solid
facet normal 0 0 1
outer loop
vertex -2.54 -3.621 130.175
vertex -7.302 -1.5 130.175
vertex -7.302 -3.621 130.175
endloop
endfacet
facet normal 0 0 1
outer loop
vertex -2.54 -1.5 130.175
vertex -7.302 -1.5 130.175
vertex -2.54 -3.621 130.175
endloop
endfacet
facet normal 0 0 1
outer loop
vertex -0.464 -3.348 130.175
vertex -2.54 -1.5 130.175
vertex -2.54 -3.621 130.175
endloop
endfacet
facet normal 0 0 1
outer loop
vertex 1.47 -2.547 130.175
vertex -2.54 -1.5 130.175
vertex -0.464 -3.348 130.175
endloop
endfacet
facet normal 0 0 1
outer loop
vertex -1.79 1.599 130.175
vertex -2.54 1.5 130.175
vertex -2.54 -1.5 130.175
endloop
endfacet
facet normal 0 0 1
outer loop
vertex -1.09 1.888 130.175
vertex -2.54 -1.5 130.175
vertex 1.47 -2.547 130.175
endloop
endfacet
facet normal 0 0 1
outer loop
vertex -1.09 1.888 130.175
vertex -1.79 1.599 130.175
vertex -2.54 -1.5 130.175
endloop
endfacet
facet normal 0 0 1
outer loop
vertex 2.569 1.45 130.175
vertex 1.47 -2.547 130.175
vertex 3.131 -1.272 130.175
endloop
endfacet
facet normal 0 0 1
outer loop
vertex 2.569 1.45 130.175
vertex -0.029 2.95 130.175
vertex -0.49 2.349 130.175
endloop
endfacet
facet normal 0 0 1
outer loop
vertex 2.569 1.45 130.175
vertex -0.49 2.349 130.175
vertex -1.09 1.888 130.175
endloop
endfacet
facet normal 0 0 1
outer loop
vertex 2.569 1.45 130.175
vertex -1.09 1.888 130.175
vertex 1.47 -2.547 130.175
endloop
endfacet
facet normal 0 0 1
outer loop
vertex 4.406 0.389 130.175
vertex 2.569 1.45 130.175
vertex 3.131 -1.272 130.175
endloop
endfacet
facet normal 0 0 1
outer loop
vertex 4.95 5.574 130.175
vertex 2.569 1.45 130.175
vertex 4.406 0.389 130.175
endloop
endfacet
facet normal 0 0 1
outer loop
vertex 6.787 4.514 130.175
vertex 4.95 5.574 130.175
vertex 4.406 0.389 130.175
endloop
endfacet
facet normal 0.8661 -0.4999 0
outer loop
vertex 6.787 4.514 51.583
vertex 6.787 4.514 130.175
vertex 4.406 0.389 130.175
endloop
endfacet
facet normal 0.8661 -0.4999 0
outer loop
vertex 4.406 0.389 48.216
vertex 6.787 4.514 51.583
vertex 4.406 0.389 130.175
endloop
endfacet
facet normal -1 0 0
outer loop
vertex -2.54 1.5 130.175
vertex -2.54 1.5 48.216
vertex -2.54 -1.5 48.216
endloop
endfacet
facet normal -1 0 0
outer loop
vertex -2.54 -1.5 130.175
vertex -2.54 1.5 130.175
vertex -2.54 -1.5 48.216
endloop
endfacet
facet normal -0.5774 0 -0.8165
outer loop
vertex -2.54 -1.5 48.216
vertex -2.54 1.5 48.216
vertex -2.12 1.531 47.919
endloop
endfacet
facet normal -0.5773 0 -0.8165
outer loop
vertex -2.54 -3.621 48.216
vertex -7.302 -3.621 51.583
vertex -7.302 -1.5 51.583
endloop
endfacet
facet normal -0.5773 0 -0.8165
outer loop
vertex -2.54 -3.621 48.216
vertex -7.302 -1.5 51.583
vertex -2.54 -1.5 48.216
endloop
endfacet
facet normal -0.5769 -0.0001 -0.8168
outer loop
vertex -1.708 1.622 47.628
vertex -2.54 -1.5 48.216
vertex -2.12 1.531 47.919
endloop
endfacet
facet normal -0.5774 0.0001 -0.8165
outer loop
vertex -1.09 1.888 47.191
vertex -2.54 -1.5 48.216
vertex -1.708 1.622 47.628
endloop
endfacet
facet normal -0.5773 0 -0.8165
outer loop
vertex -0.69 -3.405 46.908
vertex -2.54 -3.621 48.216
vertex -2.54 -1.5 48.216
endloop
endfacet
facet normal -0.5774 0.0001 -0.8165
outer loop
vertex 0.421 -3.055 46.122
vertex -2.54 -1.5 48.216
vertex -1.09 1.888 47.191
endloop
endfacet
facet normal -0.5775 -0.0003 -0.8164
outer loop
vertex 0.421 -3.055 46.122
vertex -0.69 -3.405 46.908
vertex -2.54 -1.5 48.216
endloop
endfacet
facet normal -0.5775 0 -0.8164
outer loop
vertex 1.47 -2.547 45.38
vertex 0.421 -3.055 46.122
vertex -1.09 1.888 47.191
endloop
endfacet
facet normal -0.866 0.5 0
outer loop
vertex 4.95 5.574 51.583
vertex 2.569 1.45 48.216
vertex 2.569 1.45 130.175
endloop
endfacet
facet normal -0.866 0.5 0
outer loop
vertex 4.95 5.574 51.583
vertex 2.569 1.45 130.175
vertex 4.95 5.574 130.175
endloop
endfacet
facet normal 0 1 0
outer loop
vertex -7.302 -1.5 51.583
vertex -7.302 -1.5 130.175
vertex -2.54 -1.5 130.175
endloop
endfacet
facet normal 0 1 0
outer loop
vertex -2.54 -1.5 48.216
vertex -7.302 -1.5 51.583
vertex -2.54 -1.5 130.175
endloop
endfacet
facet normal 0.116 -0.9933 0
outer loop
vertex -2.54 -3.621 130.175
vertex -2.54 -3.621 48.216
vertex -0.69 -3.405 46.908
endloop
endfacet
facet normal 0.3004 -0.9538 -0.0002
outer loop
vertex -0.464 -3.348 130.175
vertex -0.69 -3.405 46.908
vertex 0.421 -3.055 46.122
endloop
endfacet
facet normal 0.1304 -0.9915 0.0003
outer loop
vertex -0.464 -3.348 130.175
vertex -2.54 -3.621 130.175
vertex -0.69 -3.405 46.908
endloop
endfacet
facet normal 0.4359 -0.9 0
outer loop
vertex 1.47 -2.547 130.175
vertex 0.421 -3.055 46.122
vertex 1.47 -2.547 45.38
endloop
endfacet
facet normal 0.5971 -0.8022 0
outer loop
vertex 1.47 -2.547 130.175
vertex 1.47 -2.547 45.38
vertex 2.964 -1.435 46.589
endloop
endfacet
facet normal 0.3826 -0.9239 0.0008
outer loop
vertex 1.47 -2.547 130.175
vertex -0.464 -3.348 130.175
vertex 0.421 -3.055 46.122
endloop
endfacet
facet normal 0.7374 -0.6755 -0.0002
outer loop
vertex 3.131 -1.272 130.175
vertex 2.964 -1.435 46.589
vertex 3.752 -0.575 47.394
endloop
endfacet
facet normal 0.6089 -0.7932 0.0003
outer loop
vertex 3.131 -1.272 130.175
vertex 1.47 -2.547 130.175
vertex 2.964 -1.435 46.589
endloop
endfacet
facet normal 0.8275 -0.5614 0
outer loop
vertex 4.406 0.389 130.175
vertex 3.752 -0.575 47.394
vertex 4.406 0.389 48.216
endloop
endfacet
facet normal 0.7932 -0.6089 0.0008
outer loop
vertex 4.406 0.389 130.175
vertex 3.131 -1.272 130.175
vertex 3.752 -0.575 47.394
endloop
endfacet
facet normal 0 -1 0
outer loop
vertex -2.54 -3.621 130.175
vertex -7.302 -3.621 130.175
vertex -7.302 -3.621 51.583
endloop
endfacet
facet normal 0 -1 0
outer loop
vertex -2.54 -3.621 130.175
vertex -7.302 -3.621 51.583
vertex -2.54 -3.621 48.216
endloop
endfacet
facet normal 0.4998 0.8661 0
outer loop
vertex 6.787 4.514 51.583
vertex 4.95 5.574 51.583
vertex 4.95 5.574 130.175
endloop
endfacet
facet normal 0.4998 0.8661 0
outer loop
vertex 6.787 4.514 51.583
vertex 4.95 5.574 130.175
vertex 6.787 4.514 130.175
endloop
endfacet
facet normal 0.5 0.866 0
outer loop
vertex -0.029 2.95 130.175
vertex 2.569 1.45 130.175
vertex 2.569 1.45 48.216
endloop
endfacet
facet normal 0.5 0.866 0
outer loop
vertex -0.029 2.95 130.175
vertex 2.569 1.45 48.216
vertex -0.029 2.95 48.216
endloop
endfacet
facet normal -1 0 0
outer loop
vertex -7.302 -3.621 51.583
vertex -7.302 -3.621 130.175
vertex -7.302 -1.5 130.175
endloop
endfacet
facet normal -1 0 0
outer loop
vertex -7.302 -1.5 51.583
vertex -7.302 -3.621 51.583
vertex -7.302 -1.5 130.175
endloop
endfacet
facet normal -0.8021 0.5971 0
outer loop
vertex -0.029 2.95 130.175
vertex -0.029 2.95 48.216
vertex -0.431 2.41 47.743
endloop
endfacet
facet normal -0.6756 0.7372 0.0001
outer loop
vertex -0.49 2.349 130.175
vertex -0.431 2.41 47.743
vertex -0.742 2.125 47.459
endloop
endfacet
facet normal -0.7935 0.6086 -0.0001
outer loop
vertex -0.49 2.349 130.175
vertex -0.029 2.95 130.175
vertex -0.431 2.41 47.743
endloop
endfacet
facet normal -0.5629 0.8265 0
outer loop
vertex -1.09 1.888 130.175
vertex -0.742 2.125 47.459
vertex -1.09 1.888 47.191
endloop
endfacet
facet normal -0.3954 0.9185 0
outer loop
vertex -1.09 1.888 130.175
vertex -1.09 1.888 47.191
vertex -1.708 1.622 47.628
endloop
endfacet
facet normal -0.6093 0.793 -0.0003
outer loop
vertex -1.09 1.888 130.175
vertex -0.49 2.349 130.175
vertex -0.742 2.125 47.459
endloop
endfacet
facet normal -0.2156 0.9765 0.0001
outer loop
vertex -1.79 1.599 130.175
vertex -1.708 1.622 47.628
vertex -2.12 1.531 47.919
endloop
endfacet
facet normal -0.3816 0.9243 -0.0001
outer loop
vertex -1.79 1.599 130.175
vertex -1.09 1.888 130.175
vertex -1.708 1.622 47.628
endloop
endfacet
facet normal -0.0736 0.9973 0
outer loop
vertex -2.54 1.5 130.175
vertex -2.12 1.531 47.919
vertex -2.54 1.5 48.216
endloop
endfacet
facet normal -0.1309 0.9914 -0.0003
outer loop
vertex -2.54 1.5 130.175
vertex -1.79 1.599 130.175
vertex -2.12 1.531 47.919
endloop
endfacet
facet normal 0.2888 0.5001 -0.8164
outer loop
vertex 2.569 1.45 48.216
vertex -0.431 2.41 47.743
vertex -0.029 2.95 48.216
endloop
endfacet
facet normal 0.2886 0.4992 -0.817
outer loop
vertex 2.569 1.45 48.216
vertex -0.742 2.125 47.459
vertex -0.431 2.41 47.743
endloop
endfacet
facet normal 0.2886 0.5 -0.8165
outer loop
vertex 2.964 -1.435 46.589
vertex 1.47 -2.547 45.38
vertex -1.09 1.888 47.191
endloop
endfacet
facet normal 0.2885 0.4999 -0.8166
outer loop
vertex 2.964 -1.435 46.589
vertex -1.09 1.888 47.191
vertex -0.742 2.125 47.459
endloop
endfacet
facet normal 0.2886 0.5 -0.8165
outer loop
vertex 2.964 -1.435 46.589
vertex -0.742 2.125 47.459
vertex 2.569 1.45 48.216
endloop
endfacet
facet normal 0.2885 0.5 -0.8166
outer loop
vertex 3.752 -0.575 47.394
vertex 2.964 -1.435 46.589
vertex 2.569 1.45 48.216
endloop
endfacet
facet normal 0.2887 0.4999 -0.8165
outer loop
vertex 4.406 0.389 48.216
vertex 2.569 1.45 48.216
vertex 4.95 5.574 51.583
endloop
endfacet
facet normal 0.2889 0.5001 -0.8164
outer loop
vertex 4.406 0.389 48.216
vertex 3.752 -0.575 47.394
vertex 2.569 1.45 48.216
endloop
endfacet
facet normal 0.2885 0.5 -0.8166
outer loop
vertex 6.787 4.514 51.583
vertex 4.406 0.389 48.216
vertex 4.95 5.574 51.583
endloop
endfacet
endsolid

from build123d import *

# Parameters (mm, degrees)
SKETCH7_W               = 4.7625
SKETCH7_H               = 2.12122512
BOSS_EXTRUDE2_DEPTH     = 130.175
BOSS_EXTRUDE3_DEPTH     = 130.175
BOSS_EXTRUDE4_DEPTH     = 130.175
CUT_EXTRUDE1_DEPTH      = 177.833619085
CUT_EXTRUDE1_DEPTH_BACK = 177.833619085


with BuildPart() as part:
    # Sketch7 → Boss-Extrude2 (new, symmetric)
    with BuildSketch(Plane.XY):
        with Locations((-4.92125, -2.560612608)):
            Rectangle(SKETCH7_W, SKETCH7_H)
    extrude(amount=BOSS_EXTRUDE2_DEPTH, both=True)



with BuildPart() as body_2:
    # Sketch8 → Boss-Extrude3 (new, symmetric)
    with BuildSketch(Plane.XY):
        Polygon((2.569038147, 1.449704502), (4.950288147, 5.574150487), (6.787322988, 4.513537927), (4.406072988, 0.389091942), align=None)
    extrude(amount=BOSS_EXTRUDE3_DEPTH, both=True)


with BuildPart() as part_1:
    add(part.part)

    add(body_2.part)  # Boss-Extrude4 merges body 2
    # Sketch11 → Boss-Extrude4 (add, symmetric)
    with BuildSketch(Plane.XY):
        with BuildLine():
            Line((-2.54, -1.500000048), (-7.3025, -1.500000048))
            Line((-7.3025, -1.500000048), (-7.3025, -3.621225168))
            Line((-7.3025, -3.621225168), (-2.54, -3.621225168))
            ThreePointArc((-2.54, -3.621225168), (1.47031711, -2.546663937), (4.406072988, 0.389091942))
            Line((4.406072988, 0.389091942), (6.787322988, 4.513537927))
            Line((6.787322988, 4.513537927), (4.950288147, 5.574150487))
            Line((4.950288147, 5.574150487), (2.569038147, 1.449704502))
            Line((2.569038147, 1.449704502), (-0.029038147, 2.94970455))
            ThreePointArc((-0.029038147, 2.94970455), (-1.090295498, 1.888447198), (-2.54, 1.500000048))
            Line((-2.54, 1.500000048), (-2.54, -1.500000048))
        make_face()
    extrude(amount=BOSS_EXTRUDE4_DEPTH, both=True)

    # Sketch17 → Cut-Extrude1 (cut, two sides: drawn at the far end of the back side and taken through both)
    with BuildSketch(Plane(origin=(0, 0, 46.419822061), x_dir=(-0.6666666666666663, -0.5773502691896272, 0.4714045207910306), z_dir=(0.47140452079103357, -0.8164965809277251, -0.33333333333333304)).offset(-CUT_EXTRUDE1_DEPTH_BACK)):
        Polygon((304.8, 0), (0, 0), (-152.4, -263.964543073), (-304.8, 0), (-152.4, 263.964543073), (152.4, 263.964543073), align=None)
    extrude(amount=CUT_EXTRUDE1_DEPTH + CUT_EXTRUDE1_DEPTH_BACK, mode=Mode.SUBTRACT)


solid = part_1.part
